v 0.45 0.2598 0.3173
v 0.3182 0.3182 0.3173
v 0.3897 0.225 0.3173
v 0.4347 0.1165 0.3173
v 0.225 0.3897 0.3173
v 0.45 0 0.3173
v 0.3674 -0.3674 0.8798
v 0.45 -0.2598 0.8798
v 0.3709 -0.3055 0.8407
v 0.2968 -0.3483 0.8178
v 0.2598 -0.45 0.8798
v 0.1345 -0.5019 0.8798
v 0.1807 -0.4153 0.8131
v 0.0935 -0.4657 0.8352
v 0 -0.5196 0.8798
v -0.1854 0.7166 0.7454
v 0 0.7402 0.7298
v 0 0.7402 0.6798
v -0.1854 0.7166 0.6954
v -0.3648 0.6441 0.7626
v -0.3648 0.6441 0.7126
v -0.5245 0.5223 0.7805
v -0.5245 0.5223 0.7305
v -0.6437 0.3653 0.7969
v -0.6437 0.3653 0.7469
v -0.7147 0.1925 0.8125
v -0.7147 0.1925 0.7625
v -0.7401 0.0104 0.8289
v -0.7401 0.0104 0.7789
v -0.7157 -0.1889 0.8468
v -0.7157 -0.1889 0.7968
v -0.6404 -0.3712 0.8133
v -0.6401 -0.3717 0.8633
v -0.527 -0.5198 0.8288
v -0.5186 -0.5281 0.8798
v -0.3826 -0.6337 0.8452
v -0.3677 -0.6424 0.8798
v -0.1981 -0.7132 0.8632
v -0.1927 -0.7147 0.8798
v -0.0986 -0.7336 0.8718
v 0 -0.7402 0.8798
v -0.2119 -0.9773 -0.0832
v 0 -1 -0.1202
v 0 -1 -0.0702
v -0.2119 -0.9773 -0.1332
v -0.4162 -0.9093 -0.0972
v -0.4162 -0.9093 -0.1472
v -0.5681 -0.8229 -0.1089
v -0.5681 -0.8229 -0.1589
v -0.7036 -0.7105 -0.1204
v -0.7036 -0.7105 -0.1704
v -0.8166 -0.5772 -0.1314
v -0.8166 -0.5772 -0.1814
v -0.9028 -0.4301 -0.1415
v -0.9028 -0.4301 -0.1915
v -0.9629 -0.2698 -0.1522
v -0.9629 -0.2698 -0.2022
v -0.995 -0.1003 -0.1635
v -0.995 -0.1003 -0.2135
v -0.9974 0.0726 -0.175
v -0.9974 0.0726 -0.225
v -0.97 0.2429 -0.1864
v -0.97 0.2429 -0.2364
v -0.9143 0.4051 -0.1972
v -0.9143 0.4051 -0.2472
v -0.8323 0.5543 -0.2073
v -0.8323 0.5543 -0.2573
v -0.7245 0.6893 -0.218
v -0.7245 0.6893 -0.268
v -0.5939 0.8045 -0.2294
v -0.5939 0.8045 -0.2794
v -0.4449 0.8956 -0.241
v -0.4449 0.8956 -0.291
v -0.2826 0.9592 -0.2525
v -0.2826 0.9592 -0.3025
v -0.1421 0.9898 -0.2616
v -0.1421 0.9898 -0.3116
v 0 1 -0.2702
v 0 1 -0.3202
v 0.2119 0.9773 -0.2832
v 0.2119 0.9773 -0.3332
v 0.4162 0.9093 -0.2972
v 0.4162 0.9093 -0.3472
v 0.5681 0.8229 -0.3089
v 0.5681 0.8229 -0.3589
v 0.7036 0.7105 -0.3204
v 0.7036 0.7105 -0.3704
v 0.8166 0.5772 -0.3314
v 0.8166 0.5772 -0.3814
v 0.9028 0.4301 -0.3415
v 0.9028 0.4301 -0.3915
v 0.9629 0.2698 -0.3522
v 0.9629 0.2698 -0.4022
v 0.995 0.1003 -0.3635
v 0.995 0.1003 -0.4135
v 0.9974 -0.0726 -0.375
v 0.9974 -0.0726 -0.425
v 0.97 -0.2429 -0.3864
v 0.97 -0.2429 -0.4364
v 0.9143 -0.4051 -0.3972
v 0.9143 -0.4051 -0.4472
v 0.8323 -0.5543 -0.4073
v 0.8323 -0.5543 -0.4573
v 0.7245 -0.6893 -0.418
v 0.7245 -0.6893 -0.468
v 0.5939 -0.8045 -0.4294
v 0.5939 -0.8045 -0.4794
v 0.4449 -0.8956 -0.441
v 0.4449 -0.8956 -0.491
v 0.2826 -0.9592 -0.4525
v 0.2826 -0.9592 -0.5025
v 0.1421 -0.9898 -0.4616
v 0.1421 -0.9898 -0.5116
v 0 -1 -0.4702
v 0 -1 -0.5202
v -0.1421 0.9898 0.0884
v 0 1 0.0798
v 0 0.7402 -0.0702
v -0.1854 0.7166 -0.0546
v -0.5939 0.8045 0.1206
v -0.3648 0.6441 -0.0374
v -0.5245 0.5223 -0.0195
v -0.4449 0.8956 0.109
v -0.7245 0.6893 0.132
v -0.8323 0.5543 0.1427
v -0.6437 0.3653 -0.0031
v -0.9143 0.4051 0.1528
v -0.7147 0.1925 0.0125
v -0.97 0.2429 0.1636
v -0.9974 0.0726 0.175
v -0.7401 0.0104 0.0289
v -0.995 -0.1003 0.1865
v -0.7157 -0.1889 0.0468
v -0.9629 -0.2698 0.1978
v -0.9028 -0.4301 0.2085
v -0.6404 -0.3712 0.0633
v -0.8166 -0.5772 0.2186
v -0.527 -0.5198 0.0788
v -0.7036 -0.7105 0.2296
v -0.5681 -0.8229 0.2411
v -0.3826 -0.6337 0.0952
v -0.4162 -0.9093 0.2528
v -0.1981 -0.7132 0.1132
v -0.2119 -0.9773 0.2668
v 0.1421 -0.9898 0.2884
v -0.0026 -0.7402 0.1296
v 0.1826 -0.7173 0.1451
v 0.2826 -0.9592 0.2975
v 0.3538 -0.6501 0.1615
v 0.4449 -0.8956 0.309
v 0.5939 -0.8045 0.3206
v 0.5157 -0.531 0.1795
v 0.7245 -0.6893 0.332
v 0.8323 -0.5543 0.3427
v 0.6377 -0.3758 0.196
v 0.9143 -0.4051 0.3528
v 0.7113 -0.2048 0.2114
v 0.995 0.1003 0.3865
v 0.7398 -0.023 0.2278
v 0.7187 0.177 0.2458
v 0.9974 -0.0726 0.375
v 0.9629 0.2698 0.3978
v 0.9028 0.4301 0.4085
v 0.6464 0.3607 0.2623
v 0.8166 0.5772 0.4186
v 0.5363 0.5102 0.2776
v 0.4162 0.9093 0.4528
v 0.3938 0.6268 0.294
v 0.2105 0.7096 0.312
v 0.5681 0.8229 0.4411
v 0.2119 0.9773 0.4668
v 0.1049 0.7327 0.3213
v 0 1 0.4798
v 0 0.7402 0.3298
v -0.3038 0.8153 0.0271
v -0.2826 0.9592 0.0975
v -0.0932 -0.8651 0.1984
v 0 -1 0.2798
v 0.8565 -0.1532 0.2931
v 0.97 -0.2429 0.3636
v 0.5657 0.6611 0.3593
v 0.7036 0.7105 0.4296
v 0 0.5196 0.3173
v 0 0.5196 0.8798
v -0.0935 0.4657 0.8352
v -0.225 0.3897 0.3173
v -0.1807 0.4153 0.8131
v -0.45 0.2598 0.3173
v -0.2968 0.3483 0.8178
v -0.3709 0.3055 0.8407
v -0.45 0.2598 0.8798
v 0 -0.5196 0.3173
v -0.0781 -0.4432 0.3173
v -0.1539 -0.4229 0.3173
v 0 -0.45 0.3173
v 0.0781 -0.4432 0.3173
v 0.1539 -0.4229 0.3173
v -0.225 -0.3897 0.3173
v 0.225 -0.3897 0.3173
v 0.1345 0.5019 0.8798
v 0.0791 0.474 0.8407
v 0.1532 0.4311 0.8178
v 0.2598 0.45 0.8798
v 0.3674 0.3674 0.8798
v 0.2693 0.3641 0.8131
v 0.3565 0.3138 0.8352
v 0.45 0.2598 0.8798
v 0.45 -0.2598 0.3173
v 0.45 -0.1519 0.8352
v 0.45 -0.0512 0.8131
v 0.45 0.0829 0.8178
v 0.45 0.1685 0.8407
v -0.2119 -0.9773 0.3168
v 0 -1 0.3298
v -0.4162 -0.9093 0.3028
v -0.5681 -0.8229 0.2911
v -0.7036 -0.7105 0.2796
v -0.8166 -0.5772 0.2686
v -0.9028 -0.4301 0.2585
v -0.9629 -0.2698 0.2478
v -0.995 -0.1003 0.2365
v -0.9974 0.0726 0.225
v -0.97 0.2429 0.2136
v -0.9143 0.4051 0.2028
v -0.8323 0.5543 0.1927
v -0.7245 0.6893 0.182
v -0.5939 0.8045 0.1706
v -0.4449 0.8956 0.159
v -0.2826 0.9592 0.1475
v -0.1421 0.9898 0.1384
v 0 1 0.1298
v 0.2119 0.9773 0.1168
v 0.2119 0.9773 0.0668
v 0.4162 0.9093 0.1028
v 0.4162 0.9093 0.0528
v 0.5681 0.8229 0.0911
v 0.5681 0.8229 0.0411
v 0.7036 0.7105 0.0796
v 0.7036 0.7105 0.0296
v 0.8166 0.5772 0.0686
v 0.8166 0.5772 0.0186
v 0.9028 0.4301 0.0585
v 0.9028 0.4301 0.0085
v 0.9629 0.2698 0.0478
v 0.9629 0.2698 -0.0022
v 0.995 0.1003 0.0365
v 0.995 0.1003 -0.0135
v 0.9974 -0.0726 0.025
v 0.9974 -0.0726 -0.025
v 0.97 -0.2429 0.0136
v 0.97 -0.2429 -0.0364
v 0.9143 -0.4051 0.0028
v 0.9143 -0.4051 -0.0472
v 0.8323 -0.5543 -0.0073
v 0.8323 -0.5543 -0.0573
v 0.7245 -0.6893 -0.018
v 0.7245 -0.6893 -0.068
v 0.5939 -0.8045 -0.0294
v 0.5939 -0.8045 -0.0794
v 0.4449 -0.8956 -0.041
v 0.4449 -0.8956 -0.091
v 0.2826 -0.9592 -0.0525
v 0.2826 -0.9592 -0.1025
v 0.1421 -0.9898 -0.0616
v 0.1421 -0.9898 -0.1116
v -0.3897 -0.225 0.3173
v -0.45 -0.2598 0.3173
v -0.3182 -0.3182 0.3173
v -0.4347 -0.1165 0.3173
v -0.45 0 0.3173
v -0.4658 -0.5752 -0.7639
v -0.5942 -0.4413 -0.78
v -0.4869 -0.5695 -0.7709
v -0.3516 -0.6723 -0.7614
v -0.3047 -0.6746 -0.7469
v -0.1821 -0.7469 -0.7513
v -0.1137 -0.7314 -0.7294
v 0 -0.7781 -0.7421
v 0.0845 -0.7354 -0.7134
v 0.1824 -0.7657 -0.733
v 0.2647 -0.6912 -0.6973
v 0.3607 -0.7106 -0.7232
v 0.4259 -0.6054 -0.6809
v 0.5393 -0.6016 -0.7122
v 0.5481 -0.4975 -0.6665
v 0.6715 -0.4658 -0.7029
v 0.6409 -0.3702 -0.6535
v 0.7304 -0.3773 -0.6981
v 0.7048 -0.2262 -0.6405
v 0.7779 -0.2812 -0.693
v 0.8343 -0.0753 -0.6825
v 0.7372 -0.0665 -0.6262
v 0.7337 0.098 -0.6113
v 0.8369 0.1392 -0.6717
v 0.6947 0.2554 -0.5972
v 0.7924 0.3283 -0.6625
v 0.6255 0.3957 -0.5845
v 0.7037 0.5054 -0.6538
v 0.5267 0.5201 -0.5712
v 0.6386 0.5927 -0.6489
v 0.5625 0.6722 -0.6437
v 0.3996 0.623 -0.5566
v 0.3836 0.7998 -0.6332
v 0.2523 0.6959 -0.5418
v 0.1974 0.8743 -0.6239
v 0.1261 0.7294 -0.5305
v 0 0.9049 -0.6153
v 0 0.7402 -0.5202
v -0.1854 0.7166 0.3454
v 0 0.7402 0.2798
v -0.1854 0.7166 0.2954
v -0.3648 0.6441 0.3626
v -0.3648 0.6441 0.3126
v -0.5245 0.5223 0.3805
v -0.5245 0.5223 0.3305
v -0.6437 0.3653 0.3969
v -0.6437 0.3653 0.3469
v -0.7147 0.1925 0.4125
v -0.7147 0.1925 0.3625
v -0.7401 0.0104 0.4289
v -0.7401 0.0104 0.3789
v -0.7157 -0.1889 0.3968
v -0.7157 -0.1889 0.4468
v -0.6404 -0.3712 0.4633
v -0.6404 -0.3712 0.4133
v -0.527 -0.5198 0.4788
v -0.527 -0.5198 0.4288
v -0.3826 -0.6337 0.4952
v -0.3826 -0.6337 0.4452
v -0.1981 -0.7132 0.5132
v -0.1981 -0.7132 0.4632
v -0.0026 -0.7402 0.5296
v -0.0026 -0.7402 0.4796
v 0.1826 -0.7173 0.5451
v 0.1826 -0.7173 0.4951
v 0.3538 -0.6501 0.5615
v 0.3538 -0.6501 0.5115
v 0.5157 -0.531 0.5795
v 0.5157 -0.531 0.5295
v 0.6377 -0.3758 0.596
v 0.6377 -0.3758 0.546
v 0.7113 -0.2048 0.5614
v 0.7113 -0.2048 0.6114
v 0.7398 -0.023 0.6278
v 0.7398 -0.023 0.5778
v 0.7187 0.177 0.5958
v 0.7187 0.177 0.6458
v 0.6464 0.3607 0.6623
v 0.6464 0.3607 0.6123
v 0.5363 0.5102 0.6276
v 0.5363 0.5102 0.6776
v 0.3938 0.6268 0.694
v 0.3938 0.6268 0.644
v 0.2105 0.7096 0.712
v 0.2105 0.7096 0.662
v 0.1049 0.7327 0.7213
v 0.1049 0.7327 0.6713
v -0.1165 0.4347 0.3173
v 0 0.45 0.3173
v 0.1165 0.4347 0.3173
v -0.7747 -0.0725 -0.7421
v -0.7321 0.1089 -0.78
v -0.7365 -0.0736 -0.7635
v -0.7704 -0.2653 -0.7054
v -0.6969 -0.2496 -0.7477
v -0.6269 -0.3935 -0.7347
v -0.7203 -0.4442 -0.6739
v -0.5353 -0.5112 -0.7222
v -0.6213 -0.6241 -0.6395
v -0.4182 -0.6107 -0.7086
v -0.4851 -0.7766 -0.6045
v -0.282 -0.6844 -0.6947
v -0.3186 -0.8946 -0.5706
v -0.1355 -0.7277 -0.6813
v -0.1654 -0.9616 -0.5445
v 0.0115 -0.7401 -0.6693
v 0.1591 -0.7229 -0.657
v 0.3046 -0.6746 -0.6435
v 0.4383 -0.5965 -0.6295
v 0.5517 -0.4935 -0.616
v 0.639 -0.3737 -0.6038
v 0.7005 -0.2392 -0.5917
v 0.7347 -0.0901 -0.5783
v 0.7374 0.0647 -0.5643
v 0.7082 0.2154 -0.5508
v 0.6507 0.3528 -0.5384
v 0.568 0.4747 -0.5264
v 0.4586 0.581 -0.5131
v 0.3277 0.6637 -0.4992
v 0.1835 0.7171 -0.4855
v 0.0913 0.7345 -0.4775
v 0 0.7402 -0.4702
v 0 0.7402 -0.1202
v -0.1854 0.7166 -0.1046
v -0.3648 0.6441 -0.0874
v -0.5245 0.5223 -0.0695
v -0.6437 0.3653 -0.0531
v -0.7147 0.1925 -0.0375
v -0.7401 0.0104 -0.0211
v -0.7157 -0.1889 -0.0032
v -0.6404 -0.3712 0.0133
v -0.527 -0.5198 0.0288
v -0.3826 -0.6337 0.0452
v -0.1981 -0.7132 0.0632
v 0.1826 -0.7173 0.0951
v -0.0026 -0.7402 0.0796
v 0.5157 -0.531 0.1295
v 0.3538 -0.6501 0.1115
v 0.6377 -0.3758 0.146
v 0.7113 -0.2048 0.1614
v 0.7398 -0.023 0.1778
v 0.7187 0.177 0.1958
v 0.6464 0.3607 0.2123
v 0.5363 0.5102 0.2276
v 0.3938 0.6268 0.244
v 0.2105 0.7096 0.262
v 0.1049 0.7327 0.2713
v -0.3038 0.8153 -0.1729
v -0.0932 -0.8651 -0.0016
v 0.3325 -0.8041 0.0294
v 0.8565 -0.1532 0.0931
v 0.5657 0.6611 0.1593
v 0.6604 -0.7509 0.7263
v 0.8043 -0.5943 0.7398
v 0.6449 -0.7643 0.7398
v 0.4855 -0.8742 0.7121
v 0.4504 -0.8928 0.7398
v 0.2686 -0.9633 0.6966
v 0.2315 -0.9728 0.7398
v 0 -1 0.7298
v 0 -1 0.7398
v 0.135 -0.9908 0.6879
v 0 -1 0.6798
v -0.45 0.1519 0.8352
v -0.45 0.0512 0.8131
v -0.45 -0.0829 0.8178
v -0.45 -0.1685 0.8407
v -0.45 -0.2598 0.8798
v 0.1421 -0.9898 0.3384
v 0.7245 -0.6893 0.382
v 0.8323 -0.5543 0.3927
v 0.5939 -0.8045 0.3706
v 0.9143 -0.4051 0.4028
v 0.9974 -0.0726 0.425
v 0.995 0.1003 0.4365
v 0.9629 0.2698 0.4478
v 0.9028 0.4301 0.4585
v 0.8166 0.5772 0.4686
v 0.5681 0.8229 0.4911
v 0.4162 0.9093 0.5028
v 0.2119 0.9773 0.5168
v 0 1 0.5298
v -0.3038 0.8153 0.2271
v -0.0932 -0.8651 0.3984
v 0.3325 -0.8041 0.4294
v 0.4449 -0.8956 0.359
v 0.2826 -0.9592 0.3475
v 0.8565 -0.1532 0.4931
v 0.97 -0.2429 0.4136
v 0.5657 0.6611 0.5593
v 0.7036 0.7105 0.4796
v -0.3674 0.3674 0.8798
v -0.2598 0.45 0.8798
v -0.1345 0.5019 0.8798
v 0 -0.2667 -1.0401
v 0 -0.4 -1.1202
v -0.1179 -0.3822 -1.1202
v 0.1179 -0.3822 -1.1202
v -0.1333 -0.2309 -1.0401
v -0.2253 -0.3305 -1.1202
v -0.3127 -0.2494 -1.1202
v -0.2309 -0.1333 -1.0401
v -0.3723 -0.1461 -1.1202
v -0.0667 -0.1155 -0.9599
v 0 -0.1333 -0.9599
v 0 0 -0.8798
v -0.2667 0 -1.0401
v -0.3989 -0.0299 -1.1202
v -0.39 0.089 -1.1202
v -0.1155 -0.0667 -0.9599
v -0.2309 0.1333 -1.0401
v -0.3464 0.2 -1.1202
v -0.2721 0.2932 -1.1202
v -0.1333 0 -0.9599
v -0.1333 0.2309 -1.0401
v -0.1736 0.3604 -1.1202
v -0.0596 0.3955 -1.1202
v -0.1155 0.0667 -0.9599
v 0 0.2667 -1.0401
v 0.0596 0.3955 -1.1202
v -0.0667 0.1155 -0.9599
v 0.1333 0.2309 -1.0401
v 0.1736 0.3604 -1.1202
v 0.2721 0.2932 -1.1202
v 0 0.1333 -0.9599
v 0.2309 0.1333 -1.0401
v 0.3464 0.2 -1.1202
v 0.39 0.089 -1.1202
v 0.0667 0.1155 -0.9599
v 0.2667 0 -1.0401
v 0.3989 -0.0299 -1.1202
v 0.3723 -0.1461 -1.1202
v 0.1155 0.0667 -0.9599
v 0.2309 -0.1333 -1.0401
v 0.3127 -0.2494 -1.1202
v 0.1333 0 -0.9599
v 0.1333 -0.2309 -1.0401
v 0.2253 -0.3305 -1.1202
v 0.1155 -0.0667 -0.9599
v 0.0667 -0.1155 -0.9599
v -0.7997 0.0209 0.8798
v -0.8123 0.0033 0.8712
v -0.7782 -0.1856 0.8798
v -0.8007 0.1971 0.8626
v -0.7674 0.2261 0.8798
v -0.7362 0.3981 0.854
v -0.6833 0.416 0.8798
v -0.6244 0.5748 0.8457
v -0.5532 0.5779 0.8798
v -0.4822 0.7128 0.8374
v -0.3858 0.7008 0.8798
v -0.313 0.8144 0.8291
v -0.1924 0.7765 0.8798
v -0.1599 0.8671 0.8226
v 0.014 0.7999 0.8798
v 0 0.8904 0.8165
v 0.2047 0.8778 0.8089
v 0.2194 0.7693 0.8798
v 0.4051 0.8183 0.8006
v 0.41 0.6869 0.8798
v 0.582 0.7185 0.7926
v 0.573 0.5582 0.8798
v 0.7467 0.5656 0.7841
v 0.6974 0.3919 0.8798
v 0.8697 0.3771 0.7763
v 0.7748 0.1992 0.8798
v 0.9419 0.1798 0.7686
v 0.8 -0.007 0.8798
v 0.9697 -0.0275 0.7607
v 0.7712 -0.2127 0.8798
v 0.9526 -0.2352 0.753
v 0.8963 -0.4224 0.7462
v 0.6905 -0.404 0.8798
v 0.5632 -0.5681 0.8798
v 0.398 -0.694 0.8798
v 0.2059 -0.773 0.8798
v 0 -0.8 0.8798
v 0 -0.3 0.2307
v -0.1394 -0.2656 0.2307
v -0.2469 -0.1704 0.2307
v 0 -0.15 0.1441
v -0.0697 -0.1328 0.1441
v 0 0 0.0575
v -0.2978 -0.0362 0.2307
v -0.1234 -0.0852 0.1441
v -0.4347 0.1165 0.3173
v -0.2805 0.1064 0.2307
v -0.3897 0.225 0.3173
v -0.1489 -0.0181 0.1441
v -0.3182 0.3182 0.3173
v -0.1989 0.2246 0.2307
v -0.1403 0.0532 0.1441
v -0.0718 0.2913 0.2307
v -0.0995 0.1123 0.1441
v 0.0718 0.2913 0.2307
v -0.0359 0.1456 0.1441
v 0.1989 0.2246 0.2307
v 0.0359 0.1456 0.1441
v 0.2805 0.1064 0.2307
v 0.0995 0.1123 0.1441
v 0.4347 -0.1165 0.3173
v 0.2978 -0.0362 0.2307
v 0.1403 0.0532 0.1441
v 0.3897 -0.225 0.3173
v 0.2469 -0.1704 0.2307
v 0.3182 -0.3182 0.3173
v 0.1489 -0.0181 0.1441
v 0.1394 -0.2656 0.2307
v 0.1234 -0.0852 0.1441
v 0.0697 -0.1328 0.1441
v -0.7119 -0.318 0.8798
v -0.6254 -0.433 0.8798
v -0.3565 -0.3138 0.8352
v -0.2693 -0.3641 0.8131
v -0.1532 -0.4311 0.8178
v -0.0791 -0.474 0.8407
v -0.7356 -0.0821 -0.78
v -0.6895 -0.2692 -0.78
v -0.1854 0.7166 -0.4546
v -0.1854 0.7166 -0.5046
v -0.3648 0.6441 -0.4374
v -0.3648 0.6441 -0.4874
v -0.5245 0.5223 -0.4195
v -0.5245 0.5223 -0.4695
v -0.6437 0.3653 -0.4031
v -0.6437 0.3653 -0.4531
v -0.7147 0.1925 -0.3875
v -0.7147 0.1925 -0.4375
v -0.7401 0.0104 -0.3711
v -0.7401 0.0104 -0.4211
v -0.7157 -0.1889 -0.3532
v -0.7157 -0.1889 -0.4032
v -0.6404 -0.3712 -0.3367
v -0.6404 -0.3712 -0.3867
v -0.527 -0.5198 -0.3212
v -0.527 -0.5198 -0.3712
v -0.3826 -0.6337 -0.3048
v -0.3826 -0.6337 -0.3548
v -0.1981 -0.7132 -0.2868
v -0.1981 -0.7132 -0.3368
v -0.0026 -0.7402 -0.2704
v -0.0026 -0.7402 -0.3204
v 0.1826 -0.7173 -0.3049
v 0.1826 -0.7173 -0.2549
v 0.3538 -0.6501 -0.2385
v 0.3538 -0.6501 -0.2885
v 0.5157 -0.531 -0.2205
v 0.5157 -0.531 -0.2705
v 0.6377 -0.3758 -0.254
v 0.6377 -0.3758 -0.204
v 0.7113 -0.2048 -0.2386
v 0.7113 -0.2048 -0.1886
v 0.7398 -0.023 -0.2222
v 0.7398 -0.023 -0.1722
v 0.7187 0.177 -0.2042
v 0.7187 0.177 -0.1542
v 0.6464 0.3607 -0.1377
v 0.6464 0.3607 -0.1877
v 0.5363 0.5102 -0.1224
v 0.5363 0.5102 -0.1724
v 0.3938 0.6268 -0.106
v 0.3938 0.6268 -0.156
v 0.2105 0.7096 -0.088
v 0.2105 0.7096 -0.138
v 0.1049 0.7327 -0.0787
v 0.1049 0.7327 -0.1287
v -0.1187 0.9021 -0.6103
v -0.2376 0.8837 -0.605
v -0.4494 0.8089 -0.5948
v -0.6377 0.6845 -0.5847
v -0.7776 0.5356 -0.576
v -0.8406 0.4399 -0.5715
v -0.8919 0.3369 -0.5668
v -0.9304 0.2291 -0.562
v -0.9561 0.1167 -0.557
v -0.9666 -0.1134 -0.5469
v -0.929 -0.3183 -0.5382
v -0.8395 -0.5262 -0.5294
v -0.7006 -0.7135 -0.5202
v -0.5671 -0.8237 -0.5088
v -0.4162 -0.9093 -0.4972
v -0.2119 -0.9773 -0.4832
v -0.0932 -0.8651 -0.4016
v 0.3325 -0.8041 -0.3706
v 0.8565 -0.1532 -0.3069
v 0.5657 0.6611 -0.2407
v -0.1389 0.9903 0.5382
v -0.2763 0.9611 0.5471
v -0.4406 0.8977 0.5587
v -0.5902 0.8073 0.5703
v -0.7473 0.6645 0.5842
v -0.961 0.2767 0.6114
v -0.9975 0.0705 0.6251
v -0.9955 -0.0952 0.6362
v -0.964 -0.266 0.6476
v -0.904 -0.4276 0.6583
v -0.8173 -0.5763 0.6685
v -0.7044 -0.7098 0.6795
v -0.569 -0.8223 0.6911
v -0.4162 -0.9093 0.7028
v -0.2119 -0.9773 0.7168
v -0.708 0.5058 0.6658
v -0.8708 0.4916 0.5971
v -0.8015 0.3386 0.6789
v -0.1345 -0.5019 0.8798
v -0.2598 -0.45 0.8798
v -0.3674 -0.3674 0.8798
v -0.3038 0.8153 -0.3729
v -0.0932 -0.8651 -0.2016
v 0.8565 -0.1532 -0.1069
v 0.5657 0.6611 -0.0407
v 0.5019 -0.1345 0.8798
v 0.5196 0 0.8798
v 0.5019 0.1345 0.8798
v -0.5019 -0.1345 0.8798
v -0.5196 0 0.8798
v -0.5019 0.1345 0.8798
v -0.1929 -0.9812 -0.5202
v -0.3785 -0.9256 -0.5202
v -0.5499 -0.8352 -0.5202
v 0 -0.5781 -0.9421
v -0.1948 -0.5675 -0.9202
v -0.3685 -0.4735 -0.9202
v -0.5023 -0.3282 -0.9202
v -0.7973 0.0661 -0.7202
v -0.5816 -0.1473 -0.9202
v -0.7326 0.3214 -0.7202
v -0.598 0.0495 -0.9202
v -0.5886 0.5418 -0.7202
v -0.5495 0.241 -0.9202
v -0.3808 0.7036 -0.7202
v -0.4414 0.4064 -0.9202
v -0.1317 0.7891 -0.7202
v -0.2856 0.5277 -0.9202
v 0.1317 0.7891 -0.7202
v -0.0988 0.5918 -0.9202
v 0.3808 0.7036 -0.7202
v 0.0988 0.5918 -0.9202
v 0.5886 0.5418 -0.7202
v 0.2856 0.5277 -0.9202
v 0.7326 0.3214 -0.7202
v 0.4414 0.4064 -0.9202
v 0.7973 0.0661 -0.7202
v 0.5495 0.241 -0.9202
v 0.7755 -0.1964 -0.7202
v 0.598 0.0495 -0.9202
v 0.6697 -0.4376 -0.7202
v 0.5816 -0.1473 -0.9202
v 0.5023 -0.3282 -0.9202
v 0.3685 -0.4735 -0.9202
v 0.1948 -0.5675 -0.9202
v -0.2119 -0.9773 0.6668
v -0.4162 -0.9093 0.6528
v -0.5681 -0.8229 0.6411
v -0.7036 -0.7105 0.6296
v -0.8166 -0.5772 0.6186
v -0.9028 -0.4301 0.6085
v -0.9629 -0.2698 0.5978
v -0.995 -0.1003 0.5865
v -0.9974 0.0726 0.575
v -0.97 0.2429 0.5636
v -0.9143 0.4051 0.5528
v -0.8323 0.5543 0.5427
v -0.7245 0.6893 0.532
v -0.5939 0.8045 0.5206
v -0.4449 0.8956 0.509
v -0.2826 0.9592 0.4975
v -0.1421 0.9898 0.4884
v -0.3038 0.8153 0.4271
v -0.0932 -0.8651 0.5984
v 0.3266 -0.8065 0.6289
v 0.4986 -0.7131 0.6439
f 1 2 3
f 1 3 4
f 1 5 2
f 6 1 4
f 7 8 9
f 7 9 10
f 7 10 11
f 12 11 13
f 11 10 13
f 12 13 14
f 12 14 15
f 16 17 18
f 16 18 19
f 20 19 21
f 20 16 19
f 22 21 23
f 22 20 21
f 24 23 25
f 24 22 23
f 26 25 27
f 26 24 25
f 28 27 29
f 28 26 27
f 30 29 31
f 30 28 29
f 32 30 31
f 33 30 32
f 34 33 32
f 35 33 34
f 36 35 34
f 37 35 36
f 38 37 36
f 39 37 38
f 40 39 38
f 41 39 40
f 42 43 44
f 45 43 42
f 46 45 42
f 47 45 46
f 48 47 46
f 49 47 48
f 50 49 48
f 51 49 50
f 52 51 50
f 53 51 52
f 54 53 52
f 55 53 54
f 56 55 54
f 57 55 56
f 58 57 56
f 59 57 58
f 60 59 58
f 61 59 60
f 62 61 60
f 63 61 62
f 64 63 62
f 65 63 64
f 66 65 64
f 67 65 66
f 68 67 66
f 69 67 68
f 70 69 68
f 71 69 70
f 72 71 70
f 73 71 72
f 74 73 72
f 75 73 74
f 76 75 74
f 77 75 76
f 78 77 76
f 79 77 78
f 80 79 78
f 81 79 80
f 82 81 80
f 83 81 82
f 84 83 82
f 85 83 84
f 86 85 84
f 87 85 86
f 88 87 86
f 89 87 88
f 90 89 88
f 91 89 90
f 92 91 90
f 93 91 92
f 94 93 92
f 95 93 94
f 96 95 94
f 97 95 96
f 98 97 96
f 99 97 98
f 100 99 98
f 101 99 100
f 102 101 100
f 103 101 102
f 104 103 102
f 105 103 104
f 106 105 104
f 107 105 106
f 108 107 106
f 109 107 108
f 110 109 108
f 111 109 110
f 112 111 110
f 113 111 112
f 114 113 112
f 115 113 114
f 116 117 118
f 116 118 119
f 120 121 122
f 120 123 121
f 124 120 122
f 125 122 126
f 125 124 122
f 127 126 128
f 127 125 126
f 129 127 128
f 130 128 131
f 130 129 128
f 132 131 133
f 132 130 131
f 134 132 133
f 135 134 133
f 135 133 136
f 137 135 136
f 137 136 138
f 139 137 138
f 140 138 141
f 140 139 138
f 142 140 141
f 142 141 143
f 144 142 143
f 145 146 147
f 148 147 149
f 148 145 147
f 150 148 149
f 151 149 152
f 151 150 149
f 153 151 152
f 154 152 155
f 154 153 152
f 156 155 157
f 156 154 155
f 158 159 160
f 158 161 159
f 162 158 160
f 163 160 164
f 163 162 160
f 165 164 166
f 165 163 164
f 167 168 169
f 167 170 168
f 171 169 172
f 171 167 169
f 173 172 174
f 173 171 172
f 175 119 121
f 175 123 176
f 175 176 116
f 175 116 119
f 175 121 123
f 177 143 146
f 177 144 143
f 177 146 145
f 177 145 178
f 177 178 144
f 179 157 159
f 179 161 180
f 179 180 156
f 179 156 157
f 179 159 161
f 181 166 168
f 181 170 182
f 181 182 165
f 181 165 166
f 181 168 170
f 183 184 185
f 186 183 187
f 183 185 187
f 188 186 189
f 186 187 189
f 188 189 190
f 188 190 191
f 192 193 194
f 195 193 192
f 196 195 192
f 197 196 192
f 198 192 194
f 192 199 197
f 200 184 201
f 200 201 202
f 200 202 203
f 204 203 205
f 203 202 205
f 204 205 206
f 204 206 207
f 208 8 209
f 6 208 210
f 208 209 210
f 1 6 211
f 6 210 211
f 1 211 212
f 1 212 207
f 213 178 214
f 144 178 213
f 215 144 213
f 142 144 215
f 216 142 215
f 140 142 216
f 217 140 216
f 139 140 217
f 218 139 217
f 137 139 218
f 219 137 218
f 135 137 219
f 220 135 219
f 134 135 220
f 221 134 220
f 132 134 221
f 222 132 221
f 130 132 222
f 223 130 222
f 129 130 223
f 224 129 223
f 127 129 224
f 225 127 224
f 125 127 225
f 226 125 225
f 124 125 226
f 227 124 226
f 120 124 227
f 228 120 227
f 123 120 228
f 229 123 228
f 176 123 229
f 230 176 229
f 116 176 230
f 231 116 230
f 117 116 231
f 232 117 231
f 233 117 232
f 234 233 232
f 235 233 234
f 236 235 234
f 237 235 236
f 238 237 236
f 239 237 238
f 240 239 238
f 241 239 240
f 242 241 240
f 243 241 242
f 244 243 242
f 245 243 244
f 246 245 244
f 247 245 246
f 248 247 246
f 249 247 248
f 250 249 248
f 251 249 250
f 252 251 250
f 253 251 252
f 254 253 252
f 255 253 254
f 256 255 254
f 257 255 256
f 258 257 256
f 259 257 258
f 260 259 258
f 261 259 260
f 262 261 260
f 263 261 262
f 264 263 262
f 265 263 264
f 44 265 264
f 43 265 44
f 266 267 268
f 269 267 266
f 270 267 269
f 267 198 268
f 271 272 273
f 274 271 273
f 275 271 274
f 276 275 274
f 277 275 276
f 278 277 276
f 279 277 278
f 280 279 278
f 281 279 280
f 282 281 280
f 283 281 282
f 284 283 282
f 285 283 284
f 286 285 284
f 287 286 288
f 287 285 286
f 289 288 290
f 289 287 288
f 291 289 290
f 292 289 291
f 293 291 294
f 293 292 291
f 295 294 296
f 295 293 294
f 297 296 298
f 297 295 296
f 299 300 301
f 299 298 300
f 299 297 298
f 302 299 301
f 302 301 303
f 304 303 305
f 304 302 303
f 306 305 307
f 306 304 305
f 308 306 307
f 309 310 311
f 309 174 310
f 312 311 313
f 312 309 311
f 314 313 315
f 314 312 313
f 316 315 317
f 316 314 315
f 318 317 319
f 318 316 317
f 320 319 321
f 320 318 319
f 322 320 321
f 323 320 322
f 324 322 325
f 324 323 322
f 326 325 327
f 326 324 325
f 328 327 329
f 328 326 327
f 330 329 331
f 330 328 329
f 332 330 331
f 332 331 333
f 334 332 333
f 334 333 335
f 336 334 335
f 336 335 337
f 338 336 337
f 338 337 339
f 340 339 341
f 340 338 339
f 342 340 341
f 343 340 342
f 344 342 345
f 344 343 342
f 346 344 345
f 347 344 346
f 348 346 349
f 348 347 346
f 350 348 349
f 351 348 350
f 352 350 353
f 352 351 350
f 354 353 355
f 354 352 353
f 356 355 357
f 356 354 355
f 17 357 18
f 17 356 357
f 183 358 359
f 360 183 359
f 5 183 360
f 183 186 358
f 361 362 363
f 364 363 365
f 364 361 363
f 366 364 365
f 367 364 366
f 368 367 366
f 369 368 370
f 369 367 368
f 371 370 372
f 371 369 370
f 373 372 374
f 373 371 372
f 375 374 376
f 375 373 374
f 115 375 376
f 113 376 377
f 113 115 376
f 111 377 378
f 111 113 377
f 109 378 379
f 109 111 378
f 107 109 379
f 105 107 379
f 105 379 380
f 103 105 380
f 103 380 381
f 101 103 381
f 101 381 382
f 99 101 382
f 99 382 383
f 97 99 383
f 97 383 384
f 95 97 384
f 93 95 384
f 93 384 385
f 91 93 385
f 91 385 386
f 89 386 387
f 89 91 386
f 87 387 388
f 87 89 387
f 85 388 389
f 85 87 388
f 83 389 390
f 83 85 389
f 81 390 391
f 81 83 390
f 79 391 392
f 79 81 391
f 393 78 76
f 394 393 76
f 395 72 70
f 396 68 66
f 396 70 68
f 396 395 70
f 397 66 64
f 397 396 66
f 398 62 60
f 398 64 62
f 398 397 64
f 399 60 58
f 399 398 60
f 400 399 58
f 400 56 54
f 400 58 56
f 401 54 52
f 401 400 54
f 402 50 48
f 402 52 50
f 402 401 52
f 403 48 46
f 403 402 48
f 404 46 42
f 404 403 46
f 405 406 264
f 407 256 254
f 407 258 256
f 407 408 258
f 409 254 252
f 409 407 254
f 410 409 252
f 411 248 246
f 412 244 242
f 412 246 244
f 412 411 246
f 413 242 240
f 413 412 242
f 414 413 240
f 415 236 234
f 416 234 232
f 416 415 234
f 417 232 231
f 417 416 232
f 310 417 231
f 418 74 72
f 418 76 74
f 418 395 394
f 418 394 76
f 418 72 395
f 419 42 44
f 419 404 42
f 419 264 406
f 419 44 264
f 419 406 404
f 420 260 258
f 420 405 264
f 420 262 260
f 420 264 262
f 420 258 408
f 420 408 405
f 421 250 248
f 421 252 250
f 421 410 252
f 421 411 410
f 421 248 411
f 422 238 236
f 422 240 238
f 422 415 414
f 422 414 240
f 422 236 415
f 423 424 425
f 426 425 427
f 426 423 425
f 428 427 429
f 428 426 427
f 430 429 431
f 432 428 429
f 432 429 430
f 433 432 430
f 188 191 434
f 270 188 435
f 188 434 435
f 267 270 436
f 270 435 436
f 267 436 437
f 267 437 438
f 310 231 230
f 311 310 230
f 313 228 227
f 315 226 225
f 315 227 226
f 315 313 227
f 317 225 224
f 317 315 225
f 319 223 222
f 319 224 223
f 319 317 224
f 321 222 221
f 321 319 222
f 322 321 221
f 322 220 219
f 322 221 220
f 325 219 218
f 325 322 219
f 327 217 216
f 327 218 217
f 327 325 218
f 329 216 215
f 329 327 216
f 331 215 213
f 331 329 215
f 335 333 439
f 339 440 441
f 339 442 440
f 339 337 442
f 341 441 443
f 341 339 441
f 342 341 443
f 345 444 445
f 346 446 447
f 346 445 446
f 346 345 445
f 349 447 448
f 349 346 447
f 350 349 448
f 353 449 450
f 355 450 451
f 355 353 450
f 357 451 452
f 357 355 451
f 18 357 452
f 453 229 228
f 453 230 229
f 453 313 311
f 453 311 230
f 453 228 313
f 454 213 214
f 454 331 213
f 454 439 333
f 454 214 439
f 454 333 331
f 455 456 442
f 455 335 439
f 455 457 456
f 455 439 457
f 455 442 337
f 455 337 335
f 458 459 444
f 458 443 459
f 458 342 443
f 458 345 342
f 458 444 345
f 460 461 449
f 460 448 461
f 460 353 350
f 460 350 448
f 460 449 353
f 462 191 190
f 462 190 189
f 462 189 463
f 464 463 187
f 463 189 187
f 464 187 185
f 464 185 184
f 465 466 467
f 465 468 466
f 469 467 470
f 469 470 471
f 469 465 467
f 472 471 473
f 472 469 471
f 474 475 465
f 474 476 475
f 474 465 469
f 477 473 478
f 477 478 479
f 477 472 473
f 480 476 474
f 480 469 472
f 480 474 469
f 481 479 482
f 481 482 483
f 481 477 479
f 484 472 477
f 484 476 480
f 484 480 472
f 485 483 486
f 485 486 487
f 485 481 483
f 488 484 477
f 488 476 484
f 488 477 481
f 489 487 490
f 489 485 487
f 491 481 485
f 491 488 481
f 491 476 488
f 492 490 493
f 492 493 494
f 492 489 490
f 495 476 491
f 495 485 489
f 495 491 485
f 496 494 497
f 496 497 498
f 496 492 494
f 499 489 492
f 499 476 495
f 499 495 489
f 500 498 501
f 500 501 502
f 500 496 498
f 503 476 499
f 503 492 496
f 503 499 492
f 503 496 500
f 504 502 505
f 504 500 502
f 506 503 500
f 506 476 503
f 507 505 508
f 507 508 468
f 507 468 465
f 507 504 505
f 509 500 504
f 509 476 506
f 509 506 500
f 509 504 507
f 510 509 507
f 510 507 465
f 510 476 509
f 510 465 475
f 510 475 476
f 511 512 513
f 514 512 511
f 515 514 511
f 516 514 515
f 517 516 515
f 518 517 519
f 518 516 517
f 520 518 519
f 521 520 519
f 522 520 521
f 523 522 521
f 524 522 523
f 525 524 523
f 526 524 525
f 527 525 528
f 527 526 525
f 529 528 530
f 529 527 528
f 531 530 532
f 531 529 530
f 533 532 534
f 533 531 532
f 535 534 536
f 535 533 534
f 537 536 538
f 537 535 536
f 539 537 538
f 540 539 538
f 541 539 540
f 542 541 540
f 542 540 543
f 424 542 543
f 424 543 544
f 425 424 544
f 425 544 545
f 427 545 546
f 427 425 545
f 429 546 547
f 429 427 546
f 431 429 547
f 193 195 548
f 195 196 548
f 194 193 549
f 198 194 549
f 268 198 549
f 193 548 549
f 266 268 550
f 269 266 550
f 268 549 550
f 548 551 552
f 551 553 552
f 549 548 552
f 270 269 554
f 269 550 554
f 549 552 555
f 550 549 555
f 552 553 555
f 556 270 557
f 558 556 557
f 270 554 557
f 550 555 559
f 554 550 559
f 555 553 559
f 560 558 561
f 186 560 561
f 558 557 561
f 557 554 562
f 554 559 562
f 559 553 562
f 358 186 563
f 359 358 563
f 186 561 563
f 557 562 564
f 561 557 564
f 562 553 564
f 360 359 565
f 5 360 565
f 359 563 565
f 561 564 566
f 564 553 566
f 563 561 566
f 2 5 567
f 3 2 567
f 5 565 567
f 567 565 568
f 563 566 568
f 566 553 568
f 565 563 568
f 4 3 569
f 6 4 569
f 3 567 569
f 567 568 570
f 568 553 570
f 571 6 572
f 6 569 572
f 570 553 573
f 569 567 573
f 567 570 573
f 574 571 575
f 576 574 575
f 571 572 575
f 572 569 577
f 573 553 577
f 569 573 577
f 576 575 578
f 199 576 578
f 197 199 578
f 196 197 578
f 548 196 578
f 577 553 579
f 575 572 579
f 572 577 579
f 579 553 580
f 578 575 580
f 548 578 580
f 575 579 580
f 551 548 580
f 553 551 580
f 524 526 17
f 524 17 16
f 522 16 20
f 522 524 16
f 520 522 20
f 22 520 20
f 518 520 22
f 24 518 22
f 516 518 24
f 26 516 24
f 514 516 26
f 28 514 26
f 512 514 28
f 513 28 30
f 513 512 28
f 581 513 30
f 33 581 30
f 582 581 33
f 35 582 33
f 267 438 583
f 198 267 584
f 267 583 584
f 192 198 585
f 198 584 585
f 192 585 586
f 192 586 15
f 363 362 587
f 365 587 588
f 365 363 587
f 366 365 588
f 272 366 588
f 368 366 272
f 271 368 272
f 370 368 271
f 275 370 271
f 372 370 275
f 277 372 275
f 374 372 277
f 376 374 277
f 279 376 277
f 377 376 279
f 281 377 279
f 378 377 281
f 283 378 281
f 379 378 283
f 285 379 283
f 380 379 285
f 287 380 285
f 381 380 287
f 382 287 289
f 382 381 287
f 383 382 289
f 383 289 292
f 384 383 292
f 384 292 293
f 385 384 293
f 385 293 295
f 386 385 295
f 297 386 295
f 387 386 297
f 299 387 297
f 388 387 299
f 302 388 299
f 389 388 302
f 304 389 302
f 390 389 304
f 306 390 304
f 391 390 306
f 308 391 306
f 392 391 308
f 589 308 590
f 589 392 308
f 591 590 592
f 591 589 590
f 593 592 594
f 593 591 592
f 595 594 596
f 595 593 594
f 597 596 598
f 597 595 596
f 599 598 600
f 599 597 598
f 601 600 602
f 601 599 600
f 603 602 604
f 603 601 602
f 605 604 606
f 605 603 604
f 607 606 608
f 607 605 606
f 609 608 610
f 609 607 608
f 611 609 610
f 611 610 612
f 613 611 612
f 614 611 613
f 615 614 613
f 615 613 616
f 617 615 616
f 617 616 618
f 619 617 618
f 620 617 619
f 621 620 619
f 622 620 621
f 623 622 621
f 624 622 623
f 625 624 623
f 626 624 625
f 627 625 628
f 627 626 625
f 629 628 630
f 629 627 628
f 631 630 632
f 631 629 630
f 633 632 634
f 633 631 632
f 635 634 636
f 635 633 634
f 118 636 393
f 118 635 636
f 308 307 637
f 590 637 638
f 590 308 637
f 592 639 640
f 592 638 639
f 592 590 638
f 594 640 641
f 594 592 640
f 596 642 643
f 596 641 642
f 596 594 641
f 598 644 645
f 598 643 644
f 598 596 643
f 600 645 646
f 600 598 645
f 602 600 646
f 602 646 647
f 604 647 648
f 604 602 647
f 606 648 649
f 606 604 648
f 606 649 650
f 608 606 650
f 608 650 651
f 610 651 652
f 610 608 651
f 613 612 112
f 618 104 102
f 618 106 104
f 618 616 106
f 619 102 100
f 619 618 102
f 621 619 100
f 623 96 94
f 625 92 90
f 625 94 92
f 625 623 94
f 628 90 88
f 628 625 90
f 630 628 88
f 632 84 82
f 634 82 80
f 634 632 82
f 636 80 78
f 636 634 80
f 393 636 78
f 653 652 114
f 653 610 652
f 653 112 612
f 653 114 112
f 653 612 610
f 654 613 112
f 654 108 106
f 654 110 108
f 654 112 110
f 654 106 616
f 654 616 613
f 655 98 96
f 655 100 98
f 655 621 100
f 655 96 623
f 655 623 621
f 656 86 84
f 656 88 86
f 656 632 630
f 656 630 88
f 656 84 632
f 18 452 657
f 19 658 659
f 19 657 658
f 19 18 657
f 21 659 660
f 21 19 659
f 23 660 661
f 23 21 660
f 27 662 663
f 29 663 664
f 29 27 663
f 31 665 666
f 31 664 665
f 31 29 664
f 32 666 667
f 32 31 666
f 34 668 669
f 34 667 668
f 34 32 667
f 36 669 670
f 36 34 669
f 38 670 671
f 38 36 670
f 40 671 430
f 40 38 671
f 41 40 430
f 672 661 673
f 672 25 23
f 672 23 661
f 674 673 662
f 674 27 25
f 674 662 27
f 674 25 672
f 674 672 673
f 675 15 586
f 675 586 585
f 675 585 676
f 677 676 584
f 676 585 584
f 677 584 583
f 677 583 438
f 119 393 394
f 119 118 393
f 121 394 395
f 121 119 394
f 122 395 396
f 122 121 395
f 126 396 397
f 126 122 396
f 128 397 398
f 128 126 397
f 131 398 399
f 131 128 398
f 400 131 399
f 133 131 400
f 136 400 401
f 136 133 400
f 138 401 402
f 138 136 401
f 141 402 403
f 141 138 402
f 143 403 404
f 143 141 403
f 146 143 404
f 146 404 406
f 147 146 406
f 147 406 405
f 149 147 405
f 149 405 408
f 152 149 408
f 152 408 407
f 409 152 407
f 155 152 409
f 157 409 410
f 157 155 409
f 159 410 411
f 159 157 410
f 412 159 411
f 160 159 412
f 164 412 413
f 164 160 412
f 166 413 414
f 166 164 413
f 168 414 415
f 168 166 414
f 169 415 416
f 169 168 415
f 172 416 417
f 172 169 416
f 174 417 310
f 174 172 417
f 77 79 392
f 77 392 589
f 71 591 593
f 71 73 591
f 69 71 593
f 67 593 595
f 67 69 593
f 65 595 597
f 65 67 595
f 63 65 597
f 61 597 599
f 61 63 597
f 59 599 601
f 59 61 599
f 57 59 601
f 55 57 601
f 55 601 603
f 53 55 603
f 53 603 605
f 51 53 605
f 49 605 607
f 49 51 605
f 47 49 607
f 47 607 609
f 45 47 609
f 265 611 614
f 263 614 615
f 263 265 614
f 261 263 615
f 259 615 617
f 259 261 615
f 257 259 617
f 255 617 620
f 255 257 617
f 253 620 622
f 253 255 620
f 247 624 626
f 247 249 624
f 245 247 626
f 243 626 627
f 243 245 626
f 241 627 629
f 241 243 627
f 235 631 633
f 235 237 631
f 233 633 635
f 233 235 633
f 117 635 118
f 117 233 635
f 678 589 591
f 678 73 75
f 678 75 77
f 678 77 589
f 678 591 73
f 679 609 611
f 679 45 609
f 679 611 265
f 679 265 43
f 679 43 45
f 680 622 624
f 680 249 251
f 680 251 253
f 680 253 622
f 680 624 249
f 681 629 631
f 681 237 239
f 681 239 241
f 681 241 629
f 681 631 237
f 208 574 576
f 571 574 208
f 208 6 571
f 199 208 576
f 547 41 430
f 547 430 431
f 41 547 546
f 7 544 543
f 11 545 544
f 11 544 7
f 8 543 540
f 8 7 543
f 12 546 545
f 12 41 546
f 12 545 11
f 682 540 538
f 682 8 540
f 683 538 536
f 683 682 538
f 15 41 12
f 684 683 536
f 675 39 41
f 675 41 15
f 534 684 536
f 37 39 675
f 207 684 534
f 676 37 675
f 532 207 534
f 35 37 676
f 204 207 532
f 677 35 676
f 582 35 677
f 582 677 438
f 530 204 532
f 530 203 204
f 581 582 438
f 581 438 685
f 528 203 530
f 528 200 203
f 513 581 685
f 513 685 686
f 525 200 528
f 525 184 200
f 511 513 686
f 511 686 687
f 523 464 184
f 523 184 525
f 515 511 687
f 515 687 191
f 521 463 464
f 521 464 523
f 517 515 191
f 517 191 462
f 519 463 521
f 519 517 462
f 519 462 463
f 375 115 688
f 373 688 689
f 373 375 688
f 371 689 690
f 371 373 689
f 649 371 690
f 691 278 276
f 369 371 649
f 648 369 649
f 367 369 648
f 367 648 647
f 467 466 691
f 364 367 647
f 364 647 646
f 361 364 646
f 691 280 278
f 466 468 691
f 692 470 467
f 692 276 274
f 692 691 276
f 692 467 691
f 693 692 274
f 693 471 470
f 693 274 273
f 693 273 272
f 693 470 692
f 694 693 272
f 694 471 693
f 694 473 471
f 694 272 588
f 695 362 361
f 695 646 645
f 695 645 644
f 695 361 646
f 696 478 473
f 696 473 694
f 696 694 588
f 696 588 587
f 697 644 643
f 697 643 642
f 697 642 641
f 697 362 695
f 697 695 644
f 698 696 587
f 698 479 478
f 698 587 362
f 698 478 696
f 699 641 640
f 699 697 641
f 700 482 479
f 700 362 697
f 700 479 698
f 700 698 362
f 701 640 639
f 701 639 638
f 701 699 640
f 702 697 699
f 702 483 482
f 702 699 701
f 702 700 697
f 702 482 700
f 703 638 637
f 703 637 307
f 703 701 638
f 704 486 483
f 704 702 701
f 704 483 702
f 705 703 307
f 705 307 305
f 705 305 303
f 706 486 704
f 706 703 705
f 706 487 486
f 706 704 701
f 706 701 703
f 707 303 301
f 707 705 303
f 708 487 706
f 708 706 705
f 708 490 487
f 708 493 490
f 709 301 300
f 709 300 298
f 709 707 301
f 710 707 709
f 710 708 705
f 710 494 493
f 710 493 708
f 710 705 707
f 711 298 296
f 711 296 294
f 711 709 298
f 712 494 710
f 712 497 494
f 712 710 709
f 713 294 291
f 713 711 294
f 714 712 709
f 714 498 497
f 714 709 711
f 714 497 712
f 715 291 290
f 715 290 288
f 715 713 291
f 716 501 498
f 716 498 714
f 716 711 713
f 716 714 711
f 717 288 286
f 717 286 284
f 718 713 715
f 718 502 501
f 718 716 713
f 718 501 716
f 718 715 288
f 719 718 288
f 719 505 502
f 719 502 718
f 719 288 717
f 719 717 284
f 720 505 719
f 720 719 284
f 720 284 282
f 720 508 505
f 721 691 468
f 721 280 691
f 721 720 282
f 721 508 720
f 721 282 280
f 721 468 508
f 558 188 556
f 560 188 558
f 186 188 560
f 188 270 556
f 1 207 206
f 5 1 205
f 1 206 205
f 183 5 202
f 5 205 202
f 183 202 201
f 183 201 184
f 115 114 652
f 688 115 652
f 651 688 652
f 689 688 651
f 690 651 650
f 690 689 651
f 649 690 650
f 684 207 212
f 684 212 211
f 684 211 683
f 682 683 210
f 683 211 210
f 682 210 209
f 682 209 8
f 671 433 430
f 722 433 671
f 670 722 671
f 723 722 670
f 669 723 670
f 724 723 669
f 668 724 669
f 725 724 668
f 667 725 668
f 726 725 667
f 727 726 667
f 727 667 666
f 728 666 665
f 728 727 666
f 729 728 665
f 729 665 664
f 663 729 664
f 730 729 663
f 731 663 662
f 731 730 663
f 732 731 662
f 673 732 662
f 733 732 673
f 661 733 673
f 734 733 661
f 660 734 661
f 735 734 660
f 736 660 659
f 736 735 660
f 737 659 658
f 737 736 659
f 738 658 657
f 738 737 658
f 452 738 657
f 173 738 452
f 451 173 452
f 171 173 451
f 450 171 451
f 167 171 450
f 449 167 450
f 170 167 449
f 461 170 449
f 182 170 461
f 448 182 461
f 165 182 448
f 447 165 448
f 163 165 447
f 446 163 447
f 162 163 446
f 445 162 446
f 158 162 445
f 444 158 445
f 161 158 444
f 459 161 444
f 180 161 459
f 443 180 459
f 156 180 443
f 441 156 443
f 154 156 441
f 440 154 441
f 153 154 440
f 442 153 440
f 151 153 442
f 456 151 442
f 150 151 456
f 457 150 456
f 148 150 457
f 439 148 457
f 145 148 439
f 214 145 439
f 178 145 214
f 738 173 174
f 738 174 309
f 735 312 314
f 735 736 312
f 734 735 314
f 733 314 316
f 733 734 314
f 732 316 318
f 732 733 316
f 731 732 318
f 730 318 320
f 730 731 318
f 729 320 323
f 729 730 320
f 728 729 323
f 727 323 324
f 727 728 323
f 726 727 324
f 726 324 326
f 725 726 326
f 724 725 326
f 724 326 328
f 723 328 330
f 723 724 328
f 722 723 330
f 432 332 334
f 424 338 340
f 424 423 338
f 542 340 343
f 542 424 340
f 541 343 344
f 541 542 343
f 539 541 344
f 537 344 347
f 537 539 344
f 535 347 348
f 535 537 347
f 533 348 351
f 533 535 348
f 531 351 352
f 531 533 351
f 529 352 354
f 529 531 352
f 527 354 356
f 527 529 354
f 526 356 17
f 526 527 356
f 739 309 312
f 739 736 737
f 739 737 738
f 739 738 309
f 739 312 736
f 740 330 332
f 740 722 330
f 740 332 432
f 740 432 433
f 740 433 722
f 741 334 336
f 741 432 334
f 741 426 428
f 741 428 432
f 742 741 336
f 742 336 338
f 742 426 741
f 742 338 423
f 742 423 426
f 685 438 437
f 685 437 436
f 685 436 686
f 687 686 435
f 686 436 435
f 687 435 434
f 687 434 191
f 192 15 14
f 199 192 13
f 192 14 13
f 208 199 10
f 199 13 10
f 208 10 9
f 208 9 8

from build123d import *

# Parameters (mm, degrees)
CUT_EXTRUDE1_DEPTH = 0.5625
CUT_SWEEP1_PITCH   = 0.4


with BuildPart() as part:
    # Sketch1 → Revolve1 (revolve)
    with BuildSketch(Plane(origin=(0, 0, 0), x_dir=(0, 0, -1), z_dir=(1, 0, 0)), mode=Mode.PRIVATE) as revolve1_sk:
        Polygon((-0.879827876, 0), (-0.879827876, 0.8), (-0.739786369, 1), (0.520172124, 1), (1.120172124, 0.4), (0.879827876, 0), align=None)
    revolve(revolve1_sk.sketch.rotate(Axis((0, 0, -0.879827876), (0, 0, -1)), 180), axis=Axis((0, 0, -0.879827876), (0, 0, -1)))

    # Sketch2 → Cut-Extrude1 (cut)
    with BuildSketch(Plane.XY.offset(0.879827876)):
        Polygon((0, 0.519615242), (-0.45, 0.259807621), (-0.45, -0.259807621), (0, -0.519615242), (0.45, -0.259807621), (0.45, 0.259807621), align=None)
    extrude(amount=-CUT_EXTRUDE1_DEPTH, mode=Mode.SUBTRACT)

    # Cut-Extrude2 cone 1 section (through the dimple's axis) → Cut-Extrude2 (revolve, cut)
    with BuildSketch(Plane(origin=(0, 0, 0.879827876), x_dir=(0, -1, 0), z_dir=(1, 0, 0))):
        Polygon((0, 0), (0.519615242, 0), (0, 0.519615242), align=None)
    revolve(axis=Axis((0, 0, 0.879827876), (0, 0, -1)), mode=Mode.SUBTRACT)

    # Cut-Extrude3 cone 1 section (through the dimple's axis) → Cut-Extrude3 (revolve, cut)
    with BuildSketch(Plane(origin=(0, 0, 0.317327876), x_dir=(0, -1, 0), z_dir=(1, 0, 0))):
        Polygon((0, 0), (0.45, 0), (0, 0.259807621), align=None)
    revolve(axis=Axis((0, 0, 0.317327876), (0, 0, -1)), mode=Mode.SUBTRACT)

    # Cut-Sweep1: the profile of Sketch6 screwed along a right-hand helix of 5.5 turns, 6 arcs to a turn; built about Z, then put on its axis
    cut_sweep1_z = Axis((0, 0, 0), (0, 0, 1))
    cut_sweep1_corners = [(0.740192379, 0, -0.15), (1.021650635, 0, 0.0125), (1.021650635, 0, -0.3625), (0.740192379, 0, -0.2)]
    with BuildLine(mode=Mode.PRIVATE) as cut_sweep1_profile:
        Line(cut_sweep1_corners[0], cut_sweep1_corners[1])
        Line(cut_sweep1_corners[1], cut_sweep1_corners[2])
        Line(cut_sweep1_corners[2], cut_sweep1_corners[3])
        Line(cut_sweep1_corners[3], cut_sweep1_corners[0])
    cut_sweep1_cap = Face(cut_sweep1_profile.wire())
    cut_sweep1_turn_angles = [0, 30, 60, 90, 120, 150, 180, 210, 240, 270, 300, 330, 360]
    cut_sweep1_turn_weights = [1, 0.8660254037844387, 1, 0.8660254037844387, 1, 0.8660254037844387, 1, 0.8660254037844387, 1, 0.8660254037844387, 1, 0.8660254037844387, 1]
    cut_sweep1_turn_rails = [Edge.make_bspline([Vector(p[0], p[1], 0).rotate(cut_sweep1_z, cut_sweep1_turn_angles[k]) / cut_sweep1_turn_weights[k] + Vector(0, 0, p[2] + CUT_SWEEP1_PITCH * cut_sweep1_turn_angles[k] / 360) for k in range(13)], [0, 0, 0, 1, 1, 2, 2, 3, 3, 4, 4, 5, 5, 6, 6, 6], 2, cut_sweep1_turn_weights) for p in cut_sweep1_corners]
    cut_sweep1_turn_sides = [Face.make_surface_from_curves(cut_sweep1_turn_rails[p[0]], cut_sweep1_turn_rails[p[1]]) for p in [(0, 1), (1, 2), (2, 3), (3, 0)]]
    cut_sweep1_last_angles = [1800, 1830, 1860, 1890, 1920, 1950, 1980]
    cut_sweep1_last_weights = [1, 0.8660254037844387, 1, 0.8660254037844387, 1, 0.8660254037844198, 1]
    cut_sweep1_last_rails = [Edge.make_bspline([Vector(p[0], p[1], 0).rotate(cut_sweep1_z, cut_sweep1_last_angles[k]) / cut_sweep1_last_weights[k] + Vector(0, 0, p[2] + CUT_SWEEP1_PITCH * cut_sweep1_last_angles[k] / 360) for k in range(7)], [0, 0, 0, 1, 1, 2, 2, 3, 3, 3], 2, cut_sweep1_last_weights) for p in cut_sweep1_corners]
    cut_sweep1_last_sides = [Face.make_surface_from_curves(cut_sweep1_last_rails[p[0]], cut_sweep1_last_rails[p[1]]) for p in [(0, 1), (1, 2), (2, 3), (3, 0)]]
    cut_sweep1 = Plane(origin=(0, 0, -1.120172124), x_dir=(0, 1, 0), z_dir=(0, 0, 1)) * Solid(Shell([*[p.moved(Location((0, 0, CUT_SWEEP1_PITCH * i))) for i in range(5) for p in cut_sweep1_turn_sides], *cut_sweep1_last_sides, cut_sweep1_cap, cut_sweep1_cap.rotate(cut_sweep1_z, 1980).moved(Location((0, 0, CUT_SWEEP1_PITCH * 1980 / 360)))]))
    add(cut_sweep1, mode=Mode.SUBTRACT)


solid = part.part
